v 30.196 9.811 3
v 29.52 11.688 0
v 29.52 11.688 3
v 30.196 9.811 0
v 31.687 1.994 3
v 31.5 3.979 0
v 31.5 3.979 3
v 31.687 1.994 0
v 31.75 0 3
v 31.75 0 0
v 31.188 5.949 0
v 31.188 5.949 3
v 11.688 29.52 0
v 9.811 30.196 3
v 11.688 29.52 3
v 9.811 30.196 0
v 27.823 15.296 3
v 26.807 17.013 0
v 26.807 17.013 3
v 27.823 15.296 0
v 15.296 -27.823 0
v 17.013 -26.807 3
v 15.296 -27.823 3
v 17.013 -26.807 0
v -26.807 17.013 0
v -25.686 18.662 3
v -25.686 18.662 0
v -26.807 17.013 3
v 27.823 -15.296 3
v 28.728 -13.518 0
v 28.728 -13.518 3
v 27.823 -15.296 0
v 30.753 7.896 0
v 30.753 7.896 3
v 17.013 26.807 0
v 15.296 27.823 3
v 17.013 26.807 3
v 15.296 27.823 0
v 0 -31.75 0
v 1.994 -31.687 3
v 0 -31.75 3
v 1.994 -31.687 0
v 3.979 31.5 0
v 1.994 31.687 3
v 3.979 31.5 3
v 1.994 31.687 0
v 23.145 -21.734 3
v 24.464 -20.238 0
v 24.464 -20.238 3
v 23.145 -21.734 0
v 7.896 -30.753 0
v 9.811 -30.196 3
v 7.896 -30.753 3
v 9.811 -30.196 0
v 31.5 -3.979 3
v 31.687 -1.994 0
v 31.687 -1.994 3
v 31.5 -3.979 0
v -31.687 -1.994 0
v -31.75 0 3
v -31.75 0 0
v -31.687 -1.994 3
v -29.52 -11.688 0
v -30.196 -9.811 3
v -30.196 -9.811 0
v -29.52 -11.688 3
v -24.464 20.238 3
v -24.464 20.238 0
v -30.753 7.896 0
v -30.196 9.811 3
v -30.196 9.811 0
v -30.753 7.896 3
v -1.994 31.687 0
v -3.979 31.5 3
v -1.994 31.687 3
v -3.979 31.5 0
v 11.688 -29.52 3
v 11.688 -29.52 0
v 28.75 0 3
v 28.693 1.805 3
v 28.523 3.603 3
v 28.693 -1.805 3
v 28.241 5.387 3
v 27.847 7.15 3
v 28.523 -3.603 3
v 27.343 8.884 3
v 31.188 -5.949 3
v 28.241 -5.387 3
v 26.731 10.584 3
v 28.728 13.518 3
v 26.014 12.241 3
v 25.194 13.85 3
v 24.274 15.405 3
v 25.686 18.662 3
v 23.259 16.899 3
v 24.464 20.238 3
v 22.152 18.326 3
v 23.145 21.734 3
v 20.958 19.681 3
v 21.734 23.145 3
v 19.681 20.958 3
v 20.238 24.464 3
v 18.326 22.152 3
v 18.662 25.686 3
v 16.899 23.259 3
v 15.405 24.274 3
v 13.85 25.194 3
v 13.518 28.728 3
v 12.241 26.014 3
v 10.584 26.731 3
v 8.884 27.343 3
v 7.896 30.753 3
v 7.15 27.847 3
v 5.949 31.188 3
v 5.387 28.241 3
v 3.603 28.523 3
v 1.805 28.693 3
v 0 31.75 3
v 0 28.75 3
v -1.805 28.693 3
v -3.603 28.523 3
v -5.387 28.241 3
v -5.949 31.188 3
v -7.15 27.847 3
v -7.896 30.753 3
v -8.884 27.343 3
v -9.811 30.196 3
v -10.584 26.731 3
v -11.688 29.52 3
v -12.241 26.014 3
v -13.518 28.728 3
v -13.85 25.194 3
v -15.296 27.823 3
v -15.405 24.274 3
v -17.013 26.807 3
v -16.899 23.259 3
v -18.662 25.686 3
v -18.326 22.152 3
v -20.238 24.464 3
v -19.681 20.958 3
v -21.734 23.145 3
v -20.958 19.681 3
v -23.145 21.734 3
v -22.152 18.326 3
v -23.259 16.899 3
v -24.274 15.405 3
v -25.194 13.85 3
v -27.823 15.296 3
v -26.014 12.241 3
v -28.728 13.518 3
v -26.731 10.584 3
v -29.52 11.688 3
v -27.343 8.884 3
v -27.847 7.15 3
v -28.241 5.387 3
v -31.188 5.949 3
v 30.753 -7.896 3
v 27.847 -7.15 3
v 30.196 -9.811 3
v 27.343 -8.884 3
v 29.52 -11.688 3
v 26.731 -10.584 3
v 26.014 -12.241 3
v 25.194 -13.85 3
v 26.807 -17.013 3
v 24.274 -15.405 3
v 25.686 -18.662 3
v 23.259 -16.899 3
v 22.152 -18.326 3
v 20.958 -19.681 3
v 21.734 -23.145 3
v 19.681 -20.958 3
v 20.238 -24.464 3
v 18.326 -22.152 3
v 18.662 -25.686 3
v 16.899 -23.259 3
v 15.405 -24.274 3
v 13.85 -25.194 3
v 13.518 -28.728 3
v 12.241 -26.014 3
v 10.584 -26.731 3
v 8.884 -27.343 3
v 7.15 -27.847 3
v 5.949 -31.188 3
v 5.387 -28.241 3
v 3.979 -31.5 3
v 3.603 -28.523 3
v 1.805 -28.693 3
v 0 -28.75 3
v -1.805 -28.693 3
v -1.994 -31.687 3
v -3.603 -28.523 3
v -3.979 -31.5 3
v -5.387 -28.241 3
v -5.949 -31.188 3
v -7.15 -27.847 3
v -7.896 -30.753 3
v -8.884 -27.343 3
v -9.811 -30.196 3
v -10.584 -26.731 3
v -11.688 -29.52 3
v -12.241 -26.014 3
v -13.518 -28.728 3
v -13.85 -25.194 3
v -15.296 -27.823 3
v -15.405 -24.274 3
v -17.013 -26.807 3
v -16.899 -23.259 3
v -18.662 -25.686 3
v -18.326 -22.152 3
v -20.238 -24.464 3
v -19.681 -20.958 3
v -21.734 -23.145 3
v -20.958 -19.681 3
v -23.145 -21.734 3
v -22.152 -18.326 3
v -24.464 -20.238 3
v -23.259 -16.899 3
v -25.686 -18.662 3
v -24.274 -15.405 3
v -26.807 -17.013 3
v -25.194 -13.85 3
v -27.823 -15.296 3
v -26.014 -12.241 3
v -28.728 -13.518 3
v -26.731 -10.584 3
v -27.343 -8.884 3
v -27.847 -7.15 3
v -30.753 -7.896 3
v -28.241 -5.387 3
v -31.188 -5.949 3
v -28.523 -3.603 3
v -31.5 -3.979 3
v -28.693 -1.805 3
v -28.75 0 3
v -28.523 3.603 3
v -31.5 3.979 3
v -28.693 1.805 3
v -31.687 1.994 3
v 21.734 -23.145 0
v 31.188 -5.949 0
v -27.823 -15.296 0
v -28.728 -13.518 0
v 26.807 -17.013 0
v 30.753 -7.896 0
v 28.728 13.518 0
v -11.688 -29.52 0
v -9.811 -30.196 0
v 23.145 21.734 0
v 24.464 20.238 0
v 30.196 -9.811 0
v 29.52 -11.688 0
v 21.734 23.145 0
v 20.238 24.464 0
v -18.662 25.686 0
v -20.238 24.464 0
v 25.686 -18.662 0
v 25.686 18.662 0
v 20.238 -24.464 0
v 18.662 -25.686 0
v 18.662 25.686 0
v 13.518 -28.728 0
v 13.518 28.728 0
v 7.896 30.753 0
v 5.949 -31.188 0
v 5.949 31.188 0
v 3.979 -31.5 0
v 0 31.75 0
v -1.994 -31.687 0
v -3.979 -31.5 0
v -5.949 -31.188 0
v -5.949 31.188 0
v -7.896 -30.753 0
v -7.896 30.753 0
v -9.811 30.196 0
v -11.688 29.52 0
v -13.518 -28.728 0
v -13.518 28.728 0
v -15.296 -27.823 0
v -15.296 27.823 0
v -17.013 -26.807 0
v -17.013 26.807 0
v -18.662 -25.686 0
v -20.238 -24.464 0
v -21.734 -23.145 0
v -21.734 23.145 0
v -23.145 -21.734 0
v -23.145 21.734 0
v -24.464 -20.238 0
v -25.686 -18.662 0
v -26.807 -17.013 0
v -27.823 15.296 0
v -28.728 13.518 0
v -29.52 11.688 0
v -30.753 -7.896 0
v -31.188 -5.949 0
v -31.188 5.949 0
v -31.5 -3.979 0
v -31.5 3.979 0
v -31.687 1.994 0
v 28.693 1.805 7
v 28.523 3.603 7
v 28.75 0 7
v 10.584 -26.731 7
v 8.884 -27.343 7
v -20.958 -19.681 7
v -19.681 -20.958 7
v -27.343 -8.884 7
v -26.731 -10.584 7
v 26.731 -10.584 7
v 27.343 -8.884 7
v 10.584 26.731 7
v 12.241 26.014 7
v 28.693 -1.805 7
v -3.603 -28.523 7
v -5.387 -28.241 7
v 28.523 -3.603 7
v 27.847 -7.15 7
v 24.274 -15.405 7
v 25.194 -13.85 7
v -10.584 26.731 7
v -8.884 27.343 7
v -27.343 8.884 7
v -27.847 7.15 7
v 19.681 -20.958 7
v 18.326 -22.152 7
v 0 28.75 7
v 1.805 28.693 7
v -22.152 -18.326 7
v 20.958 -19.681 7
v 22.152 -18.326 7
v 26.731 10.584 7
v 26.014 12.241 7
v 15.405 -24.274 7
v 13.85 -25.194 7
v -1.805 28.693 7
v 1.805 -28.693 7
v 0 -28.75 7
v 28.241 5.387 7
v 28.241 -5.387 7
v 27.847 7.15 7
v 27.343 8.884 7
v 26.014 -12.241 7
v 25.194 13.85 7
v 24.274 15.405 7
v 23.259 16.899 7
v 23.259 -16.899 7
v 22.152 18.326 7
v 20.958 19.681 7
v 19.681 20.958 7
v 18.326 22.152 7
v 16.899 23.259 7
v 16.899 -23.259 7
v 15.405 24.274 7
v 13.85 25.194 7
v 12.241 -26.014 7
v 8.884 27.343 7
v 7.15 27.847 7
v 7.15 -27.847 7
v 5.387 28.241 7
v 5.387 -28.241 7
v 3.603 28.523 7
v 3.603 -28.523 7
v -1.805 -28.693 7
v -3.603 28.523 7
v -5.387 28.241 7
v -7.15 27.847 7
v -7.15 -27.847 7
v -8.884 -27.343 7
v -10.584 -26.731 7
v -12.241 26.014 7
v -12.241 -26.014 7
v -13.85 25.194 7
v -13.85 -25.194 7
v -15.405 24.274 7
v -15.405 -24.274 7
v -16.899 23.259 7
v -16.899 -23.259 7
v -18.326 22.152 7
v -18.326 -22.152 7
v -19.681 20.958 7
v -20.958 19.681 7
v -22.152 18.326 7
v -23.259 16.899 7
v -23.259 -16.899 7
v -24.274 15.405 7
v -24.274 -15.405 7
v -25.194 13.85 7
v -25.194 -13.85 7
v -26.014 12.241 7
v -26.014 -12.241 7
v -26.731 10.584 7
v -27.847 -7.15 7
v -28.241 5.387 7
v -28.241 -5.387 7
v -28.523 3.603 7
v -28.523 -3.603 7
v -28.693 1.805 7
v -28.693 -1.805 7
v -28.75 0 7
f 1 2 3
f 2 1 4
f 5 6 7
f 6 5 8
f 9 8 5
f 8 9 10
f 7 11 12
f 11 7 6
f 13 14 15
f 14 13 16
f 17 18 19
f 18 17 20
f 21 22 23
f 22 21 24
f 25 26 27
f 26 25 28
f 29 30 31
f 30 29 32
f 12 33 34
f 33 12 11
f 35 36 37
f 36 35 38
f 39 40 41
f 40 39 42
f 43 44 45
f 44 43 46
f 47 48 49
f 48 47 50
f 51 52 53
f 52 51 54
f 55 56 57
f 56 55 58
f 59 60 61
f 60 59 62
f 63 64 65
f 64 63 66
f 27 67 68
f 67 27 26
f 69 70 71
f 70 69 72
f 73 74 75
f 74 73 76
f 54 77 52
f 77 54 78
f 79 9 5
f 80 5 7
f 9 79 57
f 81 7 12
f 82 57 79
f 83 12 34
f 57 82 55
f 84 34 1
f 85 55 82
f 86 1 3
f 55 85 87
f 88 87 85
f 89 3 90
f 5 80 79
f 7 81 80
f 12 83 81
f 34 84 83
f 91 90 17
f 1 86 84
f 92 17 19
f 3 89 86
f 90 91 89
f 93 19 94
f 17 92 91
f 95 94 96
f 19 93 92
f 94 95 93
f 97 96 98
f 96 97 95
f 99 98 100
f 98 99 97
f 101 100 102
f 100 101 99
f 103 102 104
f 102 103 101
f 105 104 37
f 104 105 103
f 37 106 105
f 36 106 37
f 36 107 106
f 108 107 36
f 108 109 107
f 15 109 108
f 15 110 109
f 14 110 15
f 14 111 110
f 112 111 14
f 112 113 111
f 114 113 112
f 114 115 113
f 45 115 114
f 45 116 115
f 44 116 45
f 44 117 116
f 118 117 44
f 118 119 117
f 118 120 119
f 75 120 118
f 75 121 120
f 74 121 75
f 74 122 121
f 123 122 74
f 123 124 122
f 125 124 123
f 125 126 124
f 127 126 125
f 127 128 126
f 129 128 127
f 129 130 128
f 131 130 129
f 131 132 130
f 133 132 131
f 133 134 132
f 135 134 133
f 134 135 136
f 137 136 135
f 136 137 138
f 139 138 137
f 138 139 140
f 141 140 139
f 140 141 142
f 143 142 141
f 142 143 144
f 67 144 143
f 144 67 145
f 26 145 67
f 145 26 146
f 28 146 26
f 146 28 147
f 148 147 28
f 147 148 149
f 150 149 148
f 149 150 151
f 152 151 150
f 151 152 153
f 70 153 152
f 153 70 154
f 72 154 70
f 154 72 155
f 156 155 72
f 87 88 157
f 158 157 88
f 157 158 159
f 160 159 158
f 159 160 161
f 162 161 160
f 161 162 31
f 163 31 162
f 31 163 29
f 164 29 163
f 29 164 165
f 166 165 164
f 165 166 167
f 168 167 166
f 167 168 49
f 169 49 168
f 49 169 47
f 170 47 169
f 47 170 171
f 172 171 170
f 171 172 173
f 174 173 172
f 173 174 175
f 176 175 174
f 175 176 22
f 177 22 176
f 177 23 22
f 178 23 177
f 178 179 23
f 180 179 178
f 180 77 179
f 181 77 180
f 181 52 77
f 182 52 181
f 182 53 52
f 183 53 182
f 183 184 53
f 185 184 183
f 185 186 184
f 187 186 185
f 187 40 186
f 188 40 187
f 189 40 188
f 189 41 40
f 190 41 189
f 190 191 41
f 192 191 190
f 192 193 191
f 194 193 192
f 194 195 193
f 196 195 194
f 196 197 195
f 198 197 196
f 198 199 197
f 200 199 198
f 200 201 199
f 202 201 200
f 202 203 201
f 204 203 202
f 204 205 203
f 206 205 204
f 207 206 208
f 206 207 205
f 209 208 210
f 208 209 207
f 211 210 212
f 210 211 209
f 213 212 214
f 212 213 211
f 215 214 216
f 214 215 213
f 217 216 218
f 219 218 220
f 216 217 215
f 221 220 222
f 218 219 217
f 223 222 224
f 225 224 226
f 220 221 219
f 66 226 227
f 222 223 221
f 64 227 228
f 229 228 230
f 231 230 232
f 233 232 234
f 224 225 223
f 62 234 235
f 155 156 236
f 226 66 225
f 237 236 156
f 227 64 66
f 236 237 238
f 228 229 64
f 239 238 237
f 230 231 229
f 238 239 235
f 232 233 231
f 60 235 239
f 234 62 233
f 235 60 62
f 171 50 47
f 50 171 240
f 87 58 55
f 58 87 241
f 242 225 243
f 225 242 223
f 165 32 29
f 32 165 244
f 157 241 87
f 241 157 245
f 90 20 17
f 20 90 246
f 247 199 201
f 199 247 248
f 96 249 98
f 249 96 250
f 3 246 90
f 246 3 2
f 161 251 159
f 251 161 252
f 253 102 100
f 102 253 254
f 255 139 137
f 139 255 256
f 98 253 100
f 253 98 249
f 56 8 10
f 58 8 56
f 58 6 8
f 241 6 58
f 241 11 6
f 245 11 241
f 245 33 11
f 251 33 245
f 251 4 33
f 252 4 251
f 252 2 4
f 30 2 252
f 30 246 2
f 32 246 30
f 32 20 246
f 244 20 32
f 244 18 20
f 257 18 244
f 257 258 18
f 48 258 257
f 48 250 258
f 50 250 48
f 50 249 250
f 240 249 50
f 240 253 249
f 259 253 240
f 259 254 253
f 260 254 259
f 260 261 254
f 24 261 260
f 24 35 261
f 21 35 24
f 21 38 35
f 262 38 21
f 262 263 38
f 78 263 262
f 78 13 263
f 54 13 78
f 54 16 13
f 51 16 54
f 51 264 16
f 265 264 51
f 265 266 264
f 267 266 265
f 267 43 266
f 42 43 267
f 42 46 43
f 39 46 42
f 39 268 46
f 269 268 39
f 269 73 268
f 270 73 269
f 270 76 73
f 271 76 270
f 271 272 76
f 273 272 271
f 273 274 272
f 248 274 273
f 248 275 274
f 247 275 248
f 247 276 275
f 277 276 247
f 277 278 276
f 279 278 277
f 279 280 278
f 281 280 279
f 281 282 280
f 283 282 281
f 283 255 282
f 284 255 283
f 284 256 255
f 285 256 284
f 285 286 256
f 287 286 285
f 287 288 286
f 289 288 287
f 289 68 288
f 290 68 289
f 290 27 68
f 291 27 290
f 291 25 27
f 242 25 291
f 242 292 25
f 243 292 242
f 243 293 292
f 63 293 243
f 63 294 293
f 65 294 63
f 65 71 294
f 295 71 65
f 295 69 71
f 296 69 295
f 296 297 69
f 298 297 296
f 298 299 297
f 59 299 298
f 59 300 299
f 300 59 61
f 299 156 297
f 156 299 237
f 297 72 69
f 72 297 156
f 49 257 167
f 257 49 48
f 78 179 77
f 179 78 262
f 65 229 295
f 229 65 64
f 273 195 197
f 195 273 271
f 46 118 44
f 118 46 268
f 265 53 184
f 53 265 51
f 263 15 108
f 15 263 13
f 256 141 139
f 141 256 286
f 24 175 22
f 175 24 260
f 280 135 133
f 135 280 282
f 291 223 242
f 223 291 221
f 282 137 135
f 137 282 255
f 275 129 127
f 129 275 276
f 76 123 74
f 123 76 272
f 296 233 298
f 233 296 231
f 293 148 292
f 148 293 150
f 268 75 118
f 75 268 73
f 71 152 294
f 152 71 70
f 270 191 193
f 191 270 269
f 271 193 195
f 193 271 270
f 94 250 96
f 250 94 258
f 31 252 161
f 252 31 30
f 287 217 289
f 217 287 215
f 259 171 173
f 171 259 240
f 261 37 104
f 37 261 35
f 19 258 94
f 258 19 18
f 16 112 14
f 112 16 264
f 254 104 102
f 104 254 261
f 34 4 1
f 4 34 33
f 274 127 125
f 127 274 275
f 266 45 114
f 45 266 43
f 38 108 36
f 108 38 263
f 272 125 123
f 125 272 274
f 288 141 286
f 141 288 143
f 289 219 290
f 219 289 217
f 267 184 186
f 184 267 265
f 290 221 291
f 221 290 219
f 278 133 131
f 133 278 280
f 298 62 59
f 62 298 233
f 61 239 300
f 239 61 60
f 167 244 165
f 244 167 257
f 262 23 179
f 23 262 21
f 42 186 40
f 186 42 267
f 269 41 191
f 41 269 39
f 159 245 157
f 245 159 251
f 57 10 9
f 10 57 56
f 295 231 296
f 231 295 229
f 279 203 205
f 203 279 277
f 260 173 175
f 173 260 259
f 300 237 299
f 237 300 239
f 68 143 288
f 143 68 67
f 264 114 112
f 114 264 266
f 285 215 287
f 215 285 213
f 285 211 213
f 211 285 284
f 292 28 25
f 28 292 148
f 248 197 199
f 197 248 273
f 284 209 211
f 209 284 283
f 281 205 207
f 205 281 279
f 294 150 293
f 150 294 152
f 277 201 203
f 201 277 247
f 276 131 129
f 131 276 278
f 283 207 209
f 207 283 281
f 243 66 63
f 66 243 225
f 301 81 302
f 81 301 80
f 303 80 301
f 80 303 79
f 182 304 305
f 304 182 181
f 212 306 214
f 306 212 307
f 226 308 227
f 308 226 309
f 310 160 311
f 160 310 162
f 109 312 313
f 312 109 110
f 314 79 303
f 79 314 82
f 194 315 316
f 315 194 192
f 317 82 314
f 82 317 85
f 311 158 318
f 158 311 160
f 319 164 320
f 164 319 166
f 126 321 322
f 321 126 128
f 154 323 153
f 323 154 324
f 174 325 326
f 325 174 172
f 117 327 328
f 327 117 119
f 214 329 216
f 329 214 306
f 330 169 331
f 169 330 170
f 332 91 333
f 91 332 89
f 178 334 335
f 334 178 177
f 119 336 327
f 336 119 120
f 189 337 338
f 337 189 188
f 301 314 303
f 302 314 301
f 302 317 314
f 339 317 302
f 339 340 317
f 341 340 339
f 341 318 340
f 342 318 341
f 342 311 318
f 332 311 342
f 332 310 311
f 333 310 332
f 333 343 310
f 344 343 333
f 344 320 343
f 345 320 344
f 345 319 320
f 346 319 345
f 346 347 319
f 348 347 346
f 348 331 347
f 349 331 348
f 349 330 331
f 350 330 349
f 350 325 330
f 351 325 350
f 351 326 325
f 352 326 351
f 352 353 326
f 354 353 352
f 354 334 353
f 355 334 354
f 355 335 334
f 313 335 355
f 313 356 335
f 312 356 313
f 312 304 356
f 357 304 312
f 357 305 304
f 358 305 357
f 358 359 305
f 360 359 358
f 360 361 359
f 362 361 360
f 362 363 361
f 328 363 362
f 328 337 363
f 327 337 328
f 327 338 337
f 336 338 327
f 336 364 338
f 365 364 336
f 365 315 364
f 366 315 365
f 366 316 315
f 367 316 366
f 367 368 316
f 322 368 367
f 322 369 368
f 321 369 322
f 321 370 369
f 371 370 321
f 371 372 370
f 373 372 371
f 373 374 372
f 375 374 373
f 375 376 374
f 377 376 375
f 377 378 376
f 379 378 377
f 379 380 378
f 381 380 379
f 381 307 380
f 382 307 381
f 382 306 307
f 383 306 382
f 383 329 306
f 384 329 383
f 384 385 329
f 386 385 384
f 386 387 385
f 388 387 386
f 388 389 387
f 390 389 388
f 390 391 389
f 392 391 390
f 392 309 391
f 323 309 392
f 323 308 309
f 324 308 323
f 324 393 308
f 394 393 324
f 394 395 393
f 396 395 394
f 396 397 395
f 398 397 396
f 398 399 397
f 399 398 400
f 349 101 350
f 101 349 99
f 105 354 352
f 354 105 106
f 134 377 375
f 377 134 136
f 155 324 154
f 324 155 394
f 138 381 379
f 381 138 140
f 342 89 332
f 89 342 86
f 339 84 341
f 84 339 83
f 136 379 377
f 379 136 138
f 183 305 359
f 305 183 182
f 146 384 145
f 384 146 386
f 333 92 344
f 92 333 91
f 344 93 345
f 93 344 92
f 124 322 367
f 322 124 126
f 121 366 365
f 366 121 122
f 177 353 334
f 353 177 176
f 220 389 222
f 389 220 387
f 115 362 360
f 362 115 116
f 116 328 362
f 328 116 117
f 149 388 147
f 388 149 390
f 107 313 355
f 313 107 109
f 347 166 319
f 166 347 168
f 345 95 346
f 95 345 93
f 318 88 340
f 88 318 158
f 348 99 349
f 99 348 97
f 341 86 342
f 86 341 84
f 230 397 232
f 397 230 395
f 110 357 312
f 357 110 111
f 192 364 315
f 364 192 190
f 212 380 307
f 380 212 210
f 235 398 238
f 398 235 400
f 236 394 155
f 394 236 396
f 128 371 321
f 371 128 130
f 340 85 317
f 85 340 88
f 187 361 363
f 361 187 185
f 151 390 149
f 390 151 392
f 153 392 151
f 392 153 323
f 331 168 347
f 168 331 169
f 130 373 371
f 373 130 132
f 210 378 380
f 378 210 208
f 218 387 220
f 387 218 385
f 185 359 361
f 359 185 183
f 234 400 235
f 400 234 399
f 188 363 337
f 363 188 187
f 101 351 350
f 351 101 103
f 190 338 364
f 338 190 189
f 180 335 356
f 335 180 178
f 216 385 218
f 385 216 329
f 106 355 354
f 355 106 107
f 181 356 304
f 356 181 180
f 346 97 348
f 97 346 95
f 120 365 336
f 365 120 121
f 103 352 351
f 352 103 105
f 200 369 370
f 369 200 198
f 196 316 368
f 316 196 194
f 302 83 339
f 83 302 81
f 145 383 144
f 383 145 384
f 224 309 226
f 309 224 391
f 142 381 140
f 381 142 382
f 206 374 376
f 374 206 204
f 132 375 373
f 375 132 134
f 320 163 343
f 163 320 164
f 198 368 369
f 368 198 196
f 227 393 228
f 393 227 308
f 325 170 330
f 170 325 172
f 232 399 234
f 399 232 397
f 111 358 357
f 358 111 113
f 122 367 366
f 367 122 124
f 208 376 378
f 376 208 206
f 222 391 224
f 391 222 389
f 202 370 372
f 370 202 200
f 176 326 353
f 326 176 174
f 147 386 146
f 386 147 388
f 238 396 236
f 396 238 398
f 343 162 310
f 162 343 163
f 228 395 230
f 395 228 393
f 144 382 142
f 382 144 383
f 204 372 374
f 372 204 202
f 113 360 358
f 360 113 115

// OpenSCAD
// Salt Grinder Lid
// Constants
$fn=1000;
INCH_TO_MM = 25.4;
GRINDER_OD = 2.5 * INCH_TO_MM;  // 2.5 inches converted to mm
GRINDER_WALL_WIDTH = 3;  // mm
GRINDER_ID = GRINDER_OD - 2 * GRINDER_WALL_WIDTH;  // Inner diameter
LID_TOP_HEIGHT = 3;  // mm
LID_INCUT_HEIGHT = 4;  // mm

// Create the lid
union() {
    // Bottom part: Full diameter cylinder for the top of the lid
    cylinder(d = GRINDER_OD, h = LID_TOP_HEIGHT, $fn = 100);

    // Top part: Inner diameter cylinder (incut) that fits inside the grinder
    translate([0, 0, LID_TOP_HEIGHT]) {
        cylinder(d = GRINDER_ID, h = LID_INCUT_HEIGHT, $fn = 100);
    }
}
